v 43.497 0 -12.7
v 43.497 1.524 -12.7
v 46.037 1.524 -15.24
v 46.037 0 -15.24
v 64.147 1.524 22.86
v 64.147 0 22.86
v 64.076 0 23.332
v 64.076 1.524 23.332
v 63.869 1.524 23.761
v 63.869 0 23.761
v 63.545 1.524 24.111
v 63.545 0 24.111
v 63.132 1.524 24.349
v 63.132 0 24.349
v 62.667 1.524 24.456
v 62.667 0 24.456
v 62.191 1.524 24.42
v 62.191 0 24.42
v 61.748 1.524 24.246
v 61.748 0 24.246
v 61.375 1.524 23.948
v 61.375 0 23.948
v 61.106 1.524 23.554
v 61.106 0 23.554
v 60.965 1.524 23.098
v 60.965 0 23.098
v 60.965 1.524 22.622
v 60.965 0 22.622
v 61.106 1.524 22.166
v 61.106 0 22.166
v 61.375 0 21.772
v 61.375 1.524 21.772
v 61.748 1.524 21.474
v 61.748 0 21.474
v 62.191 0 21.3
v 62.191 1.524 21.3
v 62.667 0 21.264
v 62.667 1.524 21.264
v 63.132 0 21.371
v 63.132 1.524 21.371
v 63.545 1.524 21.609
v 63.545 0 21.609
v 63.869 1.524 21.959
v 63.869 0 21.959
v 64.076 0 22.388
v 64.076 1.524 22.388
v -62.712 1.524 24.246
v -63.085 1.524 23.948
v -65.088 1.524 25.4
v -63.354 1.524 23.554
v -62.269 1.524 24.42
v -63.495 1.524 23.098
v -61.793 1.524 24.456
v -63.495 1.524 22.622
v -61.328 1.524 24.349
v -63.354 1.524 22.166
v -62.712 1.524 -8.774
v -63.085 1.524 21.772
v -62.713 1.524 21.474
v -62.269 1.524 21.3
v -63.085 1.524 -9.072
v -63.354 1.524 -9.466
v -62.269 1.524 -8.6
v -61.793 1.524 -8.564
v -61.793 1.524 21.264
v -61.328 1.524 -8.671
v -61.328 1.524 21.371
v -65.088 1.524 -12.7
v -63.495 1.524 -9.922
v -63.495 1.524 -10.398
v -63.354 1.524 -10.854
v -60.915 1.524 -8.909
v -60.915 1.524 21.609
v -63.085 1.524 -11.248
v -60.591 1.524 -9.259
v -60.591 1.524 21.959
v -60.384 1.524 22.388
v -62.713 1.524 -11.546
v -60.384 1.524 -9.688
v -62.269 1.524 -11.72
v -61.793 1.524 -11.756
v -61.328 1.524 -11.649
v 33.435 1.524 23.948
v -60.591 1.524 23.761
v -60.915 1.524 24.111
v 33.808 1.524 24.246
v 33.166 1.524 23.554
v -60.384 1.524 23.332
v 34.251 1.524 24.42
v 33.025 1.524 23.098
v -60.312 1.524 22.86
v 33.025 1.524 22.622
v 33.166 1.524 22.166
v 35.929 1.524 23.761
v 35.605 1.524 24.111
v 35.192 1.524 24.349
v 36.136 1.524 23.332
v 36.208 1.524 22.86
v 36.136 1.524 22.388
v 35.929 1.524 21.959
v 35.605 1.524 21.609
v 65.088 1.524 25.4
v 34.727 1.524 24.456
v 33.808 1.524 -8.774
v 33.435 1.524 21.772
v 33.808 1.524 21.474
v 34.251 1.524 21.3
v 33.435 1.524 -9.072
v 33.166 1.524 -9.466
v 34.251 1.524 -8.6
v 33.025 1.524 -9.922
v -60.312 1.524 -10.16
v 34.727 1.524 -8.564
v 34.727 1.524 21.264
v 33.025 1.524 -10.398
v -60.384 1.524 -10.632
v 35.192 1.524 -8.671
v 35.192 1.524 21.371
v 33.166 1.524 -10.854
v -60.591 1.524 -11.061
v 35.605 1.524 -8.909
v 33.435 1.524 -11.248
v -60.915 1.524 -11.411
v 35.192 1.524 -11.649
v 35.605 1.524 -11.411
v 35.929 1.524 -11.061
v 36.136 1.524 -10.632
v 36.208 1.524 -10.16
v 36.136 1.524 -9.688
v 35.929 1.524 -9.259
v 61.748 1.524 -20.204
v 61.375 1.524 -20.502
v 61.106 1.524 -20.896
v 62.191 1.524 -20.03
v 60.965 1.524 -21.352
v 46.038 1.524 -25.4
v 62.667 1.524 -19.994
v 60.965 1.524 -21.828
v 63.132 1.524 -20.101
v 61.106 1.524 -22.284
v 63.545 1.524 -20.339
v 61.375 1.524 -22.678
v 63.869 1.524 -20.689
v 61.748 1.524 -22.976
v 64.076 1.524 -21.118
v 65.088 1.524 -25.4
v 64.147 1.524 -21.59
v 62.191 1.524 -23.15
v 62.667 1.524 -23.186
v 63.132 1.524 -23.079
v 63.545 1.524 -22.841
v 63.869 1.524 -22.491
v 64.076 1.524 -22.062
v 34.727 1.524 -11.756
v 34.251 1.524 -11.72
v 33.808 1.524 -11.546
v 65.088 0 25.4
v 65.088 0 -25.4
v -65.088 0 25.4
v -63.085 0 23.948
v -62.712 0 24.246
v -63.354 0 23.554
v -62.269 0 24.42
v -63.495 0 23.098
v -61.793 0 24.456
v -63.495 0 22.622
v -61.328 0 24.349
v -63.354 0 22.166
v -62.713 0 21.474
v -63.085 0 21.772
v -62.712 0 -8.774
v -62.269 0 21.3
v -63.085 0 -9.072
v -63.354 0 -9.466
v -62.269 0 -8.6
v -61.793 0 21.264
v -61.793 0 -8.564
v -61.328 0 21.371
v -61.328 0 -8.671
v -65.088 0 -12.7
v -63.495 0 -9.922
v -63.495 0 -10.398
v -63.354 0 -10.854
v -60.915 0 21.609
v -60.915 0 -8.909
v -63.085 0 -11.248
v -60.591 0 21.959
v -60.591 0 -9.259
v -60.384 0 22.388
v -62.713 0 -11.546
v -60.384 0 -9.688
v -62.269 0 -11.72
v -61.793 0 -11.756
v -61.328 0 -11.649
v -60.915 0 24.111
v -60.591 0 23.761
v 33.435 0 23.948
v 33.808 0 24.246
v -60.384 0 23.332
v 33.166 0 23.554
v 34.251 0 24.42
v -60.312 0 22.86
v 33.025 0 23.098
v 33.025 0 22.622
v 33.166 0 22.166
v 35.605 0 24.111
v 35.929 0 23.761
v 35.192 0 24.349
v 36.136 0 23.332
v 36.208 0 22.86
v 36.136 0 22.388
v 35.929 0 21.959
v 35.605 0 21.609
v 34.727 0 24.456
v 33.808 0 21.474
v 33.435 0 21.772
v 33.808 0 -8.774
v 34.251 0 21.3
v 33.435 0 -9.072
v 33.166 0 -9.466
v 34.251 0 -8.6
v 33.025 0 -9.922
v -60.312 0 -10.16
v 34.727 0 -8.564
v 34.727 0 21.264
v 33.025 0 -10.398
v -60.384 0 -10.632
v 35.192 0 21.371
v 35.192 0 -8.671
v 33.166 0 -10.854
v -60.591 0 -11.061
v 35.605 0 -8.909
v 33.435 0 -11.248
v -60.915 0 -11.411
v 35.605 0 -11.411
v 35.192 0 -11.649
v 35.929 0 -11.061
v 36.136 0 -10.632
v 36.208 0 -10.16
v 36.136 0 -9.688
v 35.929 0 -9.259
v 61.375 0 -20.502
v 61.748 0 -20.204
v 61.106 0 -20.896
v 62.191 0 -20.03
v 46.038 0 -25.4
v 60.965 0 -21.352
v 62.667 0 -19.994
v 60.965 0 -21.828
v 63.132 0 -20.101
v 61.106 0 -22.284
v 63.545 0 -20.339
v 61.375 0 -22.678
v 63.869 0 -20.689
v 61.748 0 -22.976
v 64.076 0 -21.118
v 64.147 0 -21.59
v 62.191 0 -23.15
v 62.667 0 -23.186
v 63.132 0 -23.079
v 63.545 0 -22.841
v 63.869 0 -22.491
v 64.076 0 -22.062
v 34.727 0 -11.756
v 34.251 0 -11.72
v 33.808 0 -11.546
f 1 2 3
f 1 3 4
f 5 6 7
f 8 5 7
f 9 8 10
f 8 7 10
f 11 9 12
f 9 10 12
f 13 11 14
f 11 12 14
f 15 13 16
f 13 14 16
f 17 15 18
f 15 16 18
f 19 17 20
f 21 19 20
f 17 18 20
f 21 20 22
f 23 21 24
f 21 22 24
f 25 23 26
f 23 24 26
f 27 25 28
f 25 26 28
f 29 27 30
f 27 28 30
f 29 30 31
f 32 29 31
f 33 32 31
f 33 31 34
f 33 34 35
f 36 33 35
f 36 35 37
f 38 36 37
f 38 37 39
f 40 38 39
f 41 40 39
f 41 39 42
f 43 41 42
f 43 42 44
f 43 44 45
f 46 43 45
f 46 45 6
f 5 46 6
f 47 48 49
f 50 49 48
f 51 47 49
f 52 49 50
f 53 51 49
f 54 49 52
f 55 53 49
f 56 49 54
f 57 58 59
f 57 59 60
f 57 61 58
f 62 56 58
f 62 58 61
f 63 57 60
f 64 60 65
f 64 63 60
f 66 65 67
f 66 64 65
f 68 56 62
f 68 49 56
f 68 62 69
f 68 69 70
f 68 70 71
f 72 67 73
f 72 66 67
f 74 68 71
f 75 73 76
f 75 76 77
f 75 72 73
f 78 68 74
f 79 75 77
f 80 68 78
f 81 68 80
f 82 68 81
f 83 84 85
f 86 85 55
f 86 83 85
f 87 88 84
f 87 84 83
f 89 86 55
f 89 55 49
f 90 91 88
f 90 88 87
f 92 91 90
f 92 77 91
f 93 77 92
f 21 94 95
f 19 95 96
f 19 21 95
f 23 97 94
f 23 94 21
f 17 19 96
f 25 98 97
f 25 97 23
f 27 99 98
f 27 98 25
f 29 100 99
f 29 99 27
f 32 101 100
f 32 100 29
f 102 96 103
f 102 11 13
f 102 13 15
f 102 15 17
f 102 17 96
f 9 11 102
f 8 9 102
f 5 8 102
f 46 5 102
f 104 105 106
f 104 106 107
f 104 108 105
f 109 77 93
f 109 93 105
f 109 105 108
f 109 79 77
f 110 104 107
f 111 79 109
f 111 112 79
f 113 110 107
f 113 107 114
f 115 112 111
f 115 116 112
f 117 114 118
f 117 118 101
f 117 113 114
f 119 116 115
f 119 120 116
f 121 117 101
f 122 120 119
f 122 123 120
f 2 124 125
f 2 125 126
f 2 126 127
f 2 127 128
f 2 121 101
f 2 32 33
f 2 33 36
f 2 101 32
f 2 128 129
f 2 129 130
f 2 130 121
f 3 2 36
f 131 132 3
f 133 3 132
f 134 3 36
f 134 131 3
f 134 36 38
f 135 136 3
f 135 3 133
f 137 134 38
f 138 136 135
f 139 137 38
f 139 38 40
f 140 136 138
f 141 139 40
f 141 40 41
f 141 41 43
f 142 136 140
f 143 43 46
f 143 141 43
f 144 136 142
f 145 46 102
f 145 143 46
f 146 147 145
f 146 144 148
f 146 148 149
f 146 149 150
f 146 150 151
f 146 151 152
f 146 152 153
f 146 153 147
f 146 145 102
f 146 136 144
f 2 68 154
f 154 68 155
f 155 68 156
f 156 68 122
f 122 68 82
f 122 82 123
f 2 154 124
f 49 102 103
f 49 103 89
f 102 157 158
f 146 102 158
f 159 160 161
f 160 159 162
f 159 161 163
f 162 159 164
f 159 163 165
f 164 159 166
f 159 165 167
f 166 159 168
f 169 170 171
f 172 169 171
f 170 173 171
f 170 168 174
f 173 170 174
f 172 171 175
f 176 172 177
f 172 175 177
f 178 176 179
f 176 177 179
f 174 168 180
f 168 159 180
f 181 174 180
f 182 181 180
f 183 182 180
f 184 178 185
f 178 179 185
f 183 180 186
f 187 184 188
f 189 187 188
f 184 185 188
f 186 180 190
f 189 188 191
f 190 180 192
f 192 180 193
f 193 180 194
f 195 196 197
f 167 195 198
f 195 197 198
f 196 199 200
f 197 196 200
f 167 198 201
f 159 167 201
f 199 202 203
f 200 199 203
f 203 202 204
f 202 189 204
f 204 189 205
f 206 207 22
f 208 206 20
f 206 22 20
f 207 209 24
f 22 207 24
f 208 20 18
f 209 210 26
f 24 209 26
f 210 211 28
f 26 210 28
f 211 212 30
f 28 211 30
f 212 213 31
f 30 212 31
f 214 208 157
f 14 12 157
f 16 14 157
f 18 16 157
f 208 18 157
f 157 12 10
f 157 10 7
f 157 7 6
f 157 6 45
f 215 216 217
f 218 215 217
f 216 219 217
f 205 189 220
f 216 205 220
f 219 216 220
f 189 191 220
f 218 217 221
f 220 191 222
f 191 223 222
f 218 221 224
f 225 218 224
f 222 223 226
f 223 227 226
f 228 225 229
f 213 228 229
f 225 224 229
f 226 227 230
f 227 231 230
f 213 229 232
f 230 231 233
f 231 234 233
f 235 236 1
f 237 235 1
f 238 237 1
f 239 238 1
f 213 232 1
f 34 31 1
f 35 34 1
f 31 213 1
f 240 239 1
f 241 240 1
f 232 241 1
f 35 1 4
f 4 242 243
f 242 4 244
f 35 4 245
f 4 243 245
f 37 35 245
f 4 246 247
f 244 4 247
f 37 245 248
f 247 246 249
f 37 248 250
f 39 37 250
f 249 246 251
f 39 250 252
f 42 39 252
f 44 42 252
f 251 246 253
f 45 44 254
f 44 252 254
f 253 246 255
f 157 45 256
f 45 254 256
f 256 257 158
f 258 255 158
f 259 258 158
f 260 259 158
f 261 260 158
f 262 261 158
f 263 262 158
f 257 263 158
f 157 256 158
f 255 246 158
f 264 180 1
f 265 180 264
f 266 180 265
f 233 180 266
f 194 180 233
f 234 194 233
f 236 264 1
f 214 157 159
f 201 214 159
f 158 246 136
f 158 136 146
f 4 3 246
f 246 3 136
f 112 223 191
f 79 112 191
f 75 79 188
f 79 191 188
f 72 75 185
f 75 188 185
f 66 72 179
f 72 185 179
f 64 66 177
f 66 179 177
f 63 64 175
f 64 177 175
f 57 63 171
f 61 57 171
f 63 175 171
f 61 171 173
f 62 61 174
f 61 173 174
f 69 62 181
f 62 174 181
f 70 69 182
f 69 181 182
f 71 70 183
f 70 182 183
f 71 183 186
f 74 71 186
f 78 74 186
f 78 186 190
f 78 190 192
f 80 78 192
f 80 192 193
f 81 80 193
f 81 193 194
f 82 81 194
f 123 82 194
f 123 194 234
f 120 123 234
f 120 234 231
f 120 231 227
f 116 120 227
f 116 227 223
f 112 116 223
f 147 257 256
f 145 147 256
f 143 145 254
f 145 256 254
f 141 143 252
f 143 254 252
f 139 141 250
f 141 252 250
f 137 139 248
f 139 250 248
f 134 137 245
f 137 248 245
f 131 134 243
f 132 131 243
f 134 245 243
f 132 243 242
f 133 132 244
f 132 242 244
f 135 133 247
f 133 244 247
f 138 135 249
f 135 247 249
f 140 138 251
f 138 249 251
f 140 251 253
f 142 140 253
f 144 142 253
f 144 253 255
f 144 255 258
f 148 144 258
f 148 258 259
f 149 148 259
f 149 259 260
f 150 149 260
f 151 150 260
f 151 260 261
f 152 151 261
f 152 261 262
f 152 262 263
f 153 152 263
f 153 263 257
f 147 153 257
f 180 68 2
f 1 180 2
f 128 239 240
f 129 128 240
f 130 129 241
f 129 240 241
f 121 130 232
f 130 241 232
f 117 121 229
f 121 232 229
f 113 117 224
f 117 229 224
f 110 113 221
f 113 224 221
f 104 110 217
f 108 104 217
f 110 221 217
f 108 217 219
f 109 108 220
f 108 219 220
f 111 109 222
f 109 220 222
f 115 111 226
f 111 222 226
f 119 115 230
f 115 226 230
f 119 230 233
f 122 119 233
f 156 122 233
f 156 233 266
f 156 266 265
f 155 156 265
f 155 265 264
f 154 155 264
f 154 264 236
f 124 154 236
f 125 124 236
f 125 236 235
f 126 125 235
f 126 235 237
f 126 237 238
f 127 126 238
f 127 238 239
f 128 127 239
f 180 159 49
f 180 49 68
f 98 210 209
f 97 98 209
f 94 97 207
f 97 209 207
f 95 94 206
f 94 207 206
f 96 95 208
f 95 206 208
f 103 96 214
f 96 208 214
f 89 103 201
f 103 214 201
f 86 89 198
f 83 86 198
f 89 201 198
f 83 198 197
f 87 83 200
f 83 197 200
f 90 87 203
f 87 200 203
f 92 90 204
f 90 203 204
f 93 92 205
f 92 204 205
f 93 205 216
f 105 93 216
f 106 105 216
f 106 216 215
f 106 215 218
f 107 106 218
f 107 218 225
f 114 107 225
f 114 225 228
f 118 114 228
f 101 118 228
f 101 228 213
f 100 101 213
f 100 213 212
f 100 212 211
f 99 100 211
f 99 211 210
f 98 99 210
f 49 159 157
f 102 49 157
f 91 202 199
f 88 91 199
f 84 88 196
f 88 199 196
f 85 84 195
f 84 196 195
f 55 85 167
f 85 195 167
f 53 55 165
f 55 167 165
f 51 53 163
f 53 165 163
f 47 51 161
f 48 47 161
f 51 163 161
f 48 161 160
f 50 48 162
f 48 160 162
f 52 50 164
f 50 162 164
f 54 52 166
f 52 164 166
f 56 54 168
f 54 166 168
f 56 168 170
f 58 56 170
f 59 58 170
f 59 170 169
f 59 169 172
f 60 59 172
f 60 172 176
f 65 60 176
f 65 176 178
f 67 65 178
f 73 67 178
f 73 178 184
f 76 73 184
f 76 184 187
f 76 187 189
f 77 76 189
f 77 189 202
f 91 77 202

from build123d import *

# Parameters (mm, degrees)
SKETCH1_W                  = 130.175
SKETCH1_H                  = 50.8
BOSS_EXTRUDE1_DEPTH        = 1.524
CUT_EXTRUDE1_REACH         = 71.885
SKETCH6_W                  = 111.125
SKETCH6_H                  = 12.7
CHAMFER2_SIZE              = 2.54
F_3_2_3_2_DIAMETER_HOLE1_D = 3.2


with BuildPart() as part:
    # Sketch1 → Boss-Extrude1 (new body)
    with BuildSketch(Plane(origin=(0, 0, 0), x_dir=(1, 0, 0), z_dir=(0, 1, 0))):
        Rectangle(SKETCH1_W, SKETCH1_H)
    extrude(amount=BOSS_EXTRUDE1_DEPTH)

    # Sketch6 → Cut-Extrude1 (cut, up to next)
    with BuildSketch(Plane(origin=(0, 1.524, 0), x_dir=(1, 0, 0), z_dir=(0, 1, 0)), mode=Mode.PRIVATE) as cut_extrude1_sk1:
        with Locations((-9.525, 19.05)):
            Rectangle(SKETCH6_W, SKETCH6_H)
    cut_extrude1_tool1 = extrude(cut_extrude1_sk1.sketch, amount=-CUT_EXTRUDE1_REACH, mode=Mode.PRIVATE) & part.part
    add(cut_extrude1_tool1.solids().sort_by_distance((-9.525, 1.524, -19.05))[0], mode=Mode.SUBTRACT)

    # Chamfer2
    chamfer2_edges = [part.edges().sort_by_distance(p)[0] for p in [
        (46.0375, 0.762, -12.7),
    ]]
    chamfer(chamfer2_edges, length=CHAMFER2_SIZE)

    # Ø3.2 (3.2) Diameter Hole1 (through all)
    with Locations(Plane(origin=(0, 1.524, 0), x_dir=(-1, 0, 0), z_dir=(0, 1, 0))):
        with Locations((-62.5475, 22.86), (-62.5475, -21.59), (-34.6075, 22.86), (-34.6075, -10.16), (61.9125, 22.86), (61.9125, -10.16)):
            Hole(F_3_2_3_2_DIAMETER_HOLE1_D / 2)


solid = part.part
